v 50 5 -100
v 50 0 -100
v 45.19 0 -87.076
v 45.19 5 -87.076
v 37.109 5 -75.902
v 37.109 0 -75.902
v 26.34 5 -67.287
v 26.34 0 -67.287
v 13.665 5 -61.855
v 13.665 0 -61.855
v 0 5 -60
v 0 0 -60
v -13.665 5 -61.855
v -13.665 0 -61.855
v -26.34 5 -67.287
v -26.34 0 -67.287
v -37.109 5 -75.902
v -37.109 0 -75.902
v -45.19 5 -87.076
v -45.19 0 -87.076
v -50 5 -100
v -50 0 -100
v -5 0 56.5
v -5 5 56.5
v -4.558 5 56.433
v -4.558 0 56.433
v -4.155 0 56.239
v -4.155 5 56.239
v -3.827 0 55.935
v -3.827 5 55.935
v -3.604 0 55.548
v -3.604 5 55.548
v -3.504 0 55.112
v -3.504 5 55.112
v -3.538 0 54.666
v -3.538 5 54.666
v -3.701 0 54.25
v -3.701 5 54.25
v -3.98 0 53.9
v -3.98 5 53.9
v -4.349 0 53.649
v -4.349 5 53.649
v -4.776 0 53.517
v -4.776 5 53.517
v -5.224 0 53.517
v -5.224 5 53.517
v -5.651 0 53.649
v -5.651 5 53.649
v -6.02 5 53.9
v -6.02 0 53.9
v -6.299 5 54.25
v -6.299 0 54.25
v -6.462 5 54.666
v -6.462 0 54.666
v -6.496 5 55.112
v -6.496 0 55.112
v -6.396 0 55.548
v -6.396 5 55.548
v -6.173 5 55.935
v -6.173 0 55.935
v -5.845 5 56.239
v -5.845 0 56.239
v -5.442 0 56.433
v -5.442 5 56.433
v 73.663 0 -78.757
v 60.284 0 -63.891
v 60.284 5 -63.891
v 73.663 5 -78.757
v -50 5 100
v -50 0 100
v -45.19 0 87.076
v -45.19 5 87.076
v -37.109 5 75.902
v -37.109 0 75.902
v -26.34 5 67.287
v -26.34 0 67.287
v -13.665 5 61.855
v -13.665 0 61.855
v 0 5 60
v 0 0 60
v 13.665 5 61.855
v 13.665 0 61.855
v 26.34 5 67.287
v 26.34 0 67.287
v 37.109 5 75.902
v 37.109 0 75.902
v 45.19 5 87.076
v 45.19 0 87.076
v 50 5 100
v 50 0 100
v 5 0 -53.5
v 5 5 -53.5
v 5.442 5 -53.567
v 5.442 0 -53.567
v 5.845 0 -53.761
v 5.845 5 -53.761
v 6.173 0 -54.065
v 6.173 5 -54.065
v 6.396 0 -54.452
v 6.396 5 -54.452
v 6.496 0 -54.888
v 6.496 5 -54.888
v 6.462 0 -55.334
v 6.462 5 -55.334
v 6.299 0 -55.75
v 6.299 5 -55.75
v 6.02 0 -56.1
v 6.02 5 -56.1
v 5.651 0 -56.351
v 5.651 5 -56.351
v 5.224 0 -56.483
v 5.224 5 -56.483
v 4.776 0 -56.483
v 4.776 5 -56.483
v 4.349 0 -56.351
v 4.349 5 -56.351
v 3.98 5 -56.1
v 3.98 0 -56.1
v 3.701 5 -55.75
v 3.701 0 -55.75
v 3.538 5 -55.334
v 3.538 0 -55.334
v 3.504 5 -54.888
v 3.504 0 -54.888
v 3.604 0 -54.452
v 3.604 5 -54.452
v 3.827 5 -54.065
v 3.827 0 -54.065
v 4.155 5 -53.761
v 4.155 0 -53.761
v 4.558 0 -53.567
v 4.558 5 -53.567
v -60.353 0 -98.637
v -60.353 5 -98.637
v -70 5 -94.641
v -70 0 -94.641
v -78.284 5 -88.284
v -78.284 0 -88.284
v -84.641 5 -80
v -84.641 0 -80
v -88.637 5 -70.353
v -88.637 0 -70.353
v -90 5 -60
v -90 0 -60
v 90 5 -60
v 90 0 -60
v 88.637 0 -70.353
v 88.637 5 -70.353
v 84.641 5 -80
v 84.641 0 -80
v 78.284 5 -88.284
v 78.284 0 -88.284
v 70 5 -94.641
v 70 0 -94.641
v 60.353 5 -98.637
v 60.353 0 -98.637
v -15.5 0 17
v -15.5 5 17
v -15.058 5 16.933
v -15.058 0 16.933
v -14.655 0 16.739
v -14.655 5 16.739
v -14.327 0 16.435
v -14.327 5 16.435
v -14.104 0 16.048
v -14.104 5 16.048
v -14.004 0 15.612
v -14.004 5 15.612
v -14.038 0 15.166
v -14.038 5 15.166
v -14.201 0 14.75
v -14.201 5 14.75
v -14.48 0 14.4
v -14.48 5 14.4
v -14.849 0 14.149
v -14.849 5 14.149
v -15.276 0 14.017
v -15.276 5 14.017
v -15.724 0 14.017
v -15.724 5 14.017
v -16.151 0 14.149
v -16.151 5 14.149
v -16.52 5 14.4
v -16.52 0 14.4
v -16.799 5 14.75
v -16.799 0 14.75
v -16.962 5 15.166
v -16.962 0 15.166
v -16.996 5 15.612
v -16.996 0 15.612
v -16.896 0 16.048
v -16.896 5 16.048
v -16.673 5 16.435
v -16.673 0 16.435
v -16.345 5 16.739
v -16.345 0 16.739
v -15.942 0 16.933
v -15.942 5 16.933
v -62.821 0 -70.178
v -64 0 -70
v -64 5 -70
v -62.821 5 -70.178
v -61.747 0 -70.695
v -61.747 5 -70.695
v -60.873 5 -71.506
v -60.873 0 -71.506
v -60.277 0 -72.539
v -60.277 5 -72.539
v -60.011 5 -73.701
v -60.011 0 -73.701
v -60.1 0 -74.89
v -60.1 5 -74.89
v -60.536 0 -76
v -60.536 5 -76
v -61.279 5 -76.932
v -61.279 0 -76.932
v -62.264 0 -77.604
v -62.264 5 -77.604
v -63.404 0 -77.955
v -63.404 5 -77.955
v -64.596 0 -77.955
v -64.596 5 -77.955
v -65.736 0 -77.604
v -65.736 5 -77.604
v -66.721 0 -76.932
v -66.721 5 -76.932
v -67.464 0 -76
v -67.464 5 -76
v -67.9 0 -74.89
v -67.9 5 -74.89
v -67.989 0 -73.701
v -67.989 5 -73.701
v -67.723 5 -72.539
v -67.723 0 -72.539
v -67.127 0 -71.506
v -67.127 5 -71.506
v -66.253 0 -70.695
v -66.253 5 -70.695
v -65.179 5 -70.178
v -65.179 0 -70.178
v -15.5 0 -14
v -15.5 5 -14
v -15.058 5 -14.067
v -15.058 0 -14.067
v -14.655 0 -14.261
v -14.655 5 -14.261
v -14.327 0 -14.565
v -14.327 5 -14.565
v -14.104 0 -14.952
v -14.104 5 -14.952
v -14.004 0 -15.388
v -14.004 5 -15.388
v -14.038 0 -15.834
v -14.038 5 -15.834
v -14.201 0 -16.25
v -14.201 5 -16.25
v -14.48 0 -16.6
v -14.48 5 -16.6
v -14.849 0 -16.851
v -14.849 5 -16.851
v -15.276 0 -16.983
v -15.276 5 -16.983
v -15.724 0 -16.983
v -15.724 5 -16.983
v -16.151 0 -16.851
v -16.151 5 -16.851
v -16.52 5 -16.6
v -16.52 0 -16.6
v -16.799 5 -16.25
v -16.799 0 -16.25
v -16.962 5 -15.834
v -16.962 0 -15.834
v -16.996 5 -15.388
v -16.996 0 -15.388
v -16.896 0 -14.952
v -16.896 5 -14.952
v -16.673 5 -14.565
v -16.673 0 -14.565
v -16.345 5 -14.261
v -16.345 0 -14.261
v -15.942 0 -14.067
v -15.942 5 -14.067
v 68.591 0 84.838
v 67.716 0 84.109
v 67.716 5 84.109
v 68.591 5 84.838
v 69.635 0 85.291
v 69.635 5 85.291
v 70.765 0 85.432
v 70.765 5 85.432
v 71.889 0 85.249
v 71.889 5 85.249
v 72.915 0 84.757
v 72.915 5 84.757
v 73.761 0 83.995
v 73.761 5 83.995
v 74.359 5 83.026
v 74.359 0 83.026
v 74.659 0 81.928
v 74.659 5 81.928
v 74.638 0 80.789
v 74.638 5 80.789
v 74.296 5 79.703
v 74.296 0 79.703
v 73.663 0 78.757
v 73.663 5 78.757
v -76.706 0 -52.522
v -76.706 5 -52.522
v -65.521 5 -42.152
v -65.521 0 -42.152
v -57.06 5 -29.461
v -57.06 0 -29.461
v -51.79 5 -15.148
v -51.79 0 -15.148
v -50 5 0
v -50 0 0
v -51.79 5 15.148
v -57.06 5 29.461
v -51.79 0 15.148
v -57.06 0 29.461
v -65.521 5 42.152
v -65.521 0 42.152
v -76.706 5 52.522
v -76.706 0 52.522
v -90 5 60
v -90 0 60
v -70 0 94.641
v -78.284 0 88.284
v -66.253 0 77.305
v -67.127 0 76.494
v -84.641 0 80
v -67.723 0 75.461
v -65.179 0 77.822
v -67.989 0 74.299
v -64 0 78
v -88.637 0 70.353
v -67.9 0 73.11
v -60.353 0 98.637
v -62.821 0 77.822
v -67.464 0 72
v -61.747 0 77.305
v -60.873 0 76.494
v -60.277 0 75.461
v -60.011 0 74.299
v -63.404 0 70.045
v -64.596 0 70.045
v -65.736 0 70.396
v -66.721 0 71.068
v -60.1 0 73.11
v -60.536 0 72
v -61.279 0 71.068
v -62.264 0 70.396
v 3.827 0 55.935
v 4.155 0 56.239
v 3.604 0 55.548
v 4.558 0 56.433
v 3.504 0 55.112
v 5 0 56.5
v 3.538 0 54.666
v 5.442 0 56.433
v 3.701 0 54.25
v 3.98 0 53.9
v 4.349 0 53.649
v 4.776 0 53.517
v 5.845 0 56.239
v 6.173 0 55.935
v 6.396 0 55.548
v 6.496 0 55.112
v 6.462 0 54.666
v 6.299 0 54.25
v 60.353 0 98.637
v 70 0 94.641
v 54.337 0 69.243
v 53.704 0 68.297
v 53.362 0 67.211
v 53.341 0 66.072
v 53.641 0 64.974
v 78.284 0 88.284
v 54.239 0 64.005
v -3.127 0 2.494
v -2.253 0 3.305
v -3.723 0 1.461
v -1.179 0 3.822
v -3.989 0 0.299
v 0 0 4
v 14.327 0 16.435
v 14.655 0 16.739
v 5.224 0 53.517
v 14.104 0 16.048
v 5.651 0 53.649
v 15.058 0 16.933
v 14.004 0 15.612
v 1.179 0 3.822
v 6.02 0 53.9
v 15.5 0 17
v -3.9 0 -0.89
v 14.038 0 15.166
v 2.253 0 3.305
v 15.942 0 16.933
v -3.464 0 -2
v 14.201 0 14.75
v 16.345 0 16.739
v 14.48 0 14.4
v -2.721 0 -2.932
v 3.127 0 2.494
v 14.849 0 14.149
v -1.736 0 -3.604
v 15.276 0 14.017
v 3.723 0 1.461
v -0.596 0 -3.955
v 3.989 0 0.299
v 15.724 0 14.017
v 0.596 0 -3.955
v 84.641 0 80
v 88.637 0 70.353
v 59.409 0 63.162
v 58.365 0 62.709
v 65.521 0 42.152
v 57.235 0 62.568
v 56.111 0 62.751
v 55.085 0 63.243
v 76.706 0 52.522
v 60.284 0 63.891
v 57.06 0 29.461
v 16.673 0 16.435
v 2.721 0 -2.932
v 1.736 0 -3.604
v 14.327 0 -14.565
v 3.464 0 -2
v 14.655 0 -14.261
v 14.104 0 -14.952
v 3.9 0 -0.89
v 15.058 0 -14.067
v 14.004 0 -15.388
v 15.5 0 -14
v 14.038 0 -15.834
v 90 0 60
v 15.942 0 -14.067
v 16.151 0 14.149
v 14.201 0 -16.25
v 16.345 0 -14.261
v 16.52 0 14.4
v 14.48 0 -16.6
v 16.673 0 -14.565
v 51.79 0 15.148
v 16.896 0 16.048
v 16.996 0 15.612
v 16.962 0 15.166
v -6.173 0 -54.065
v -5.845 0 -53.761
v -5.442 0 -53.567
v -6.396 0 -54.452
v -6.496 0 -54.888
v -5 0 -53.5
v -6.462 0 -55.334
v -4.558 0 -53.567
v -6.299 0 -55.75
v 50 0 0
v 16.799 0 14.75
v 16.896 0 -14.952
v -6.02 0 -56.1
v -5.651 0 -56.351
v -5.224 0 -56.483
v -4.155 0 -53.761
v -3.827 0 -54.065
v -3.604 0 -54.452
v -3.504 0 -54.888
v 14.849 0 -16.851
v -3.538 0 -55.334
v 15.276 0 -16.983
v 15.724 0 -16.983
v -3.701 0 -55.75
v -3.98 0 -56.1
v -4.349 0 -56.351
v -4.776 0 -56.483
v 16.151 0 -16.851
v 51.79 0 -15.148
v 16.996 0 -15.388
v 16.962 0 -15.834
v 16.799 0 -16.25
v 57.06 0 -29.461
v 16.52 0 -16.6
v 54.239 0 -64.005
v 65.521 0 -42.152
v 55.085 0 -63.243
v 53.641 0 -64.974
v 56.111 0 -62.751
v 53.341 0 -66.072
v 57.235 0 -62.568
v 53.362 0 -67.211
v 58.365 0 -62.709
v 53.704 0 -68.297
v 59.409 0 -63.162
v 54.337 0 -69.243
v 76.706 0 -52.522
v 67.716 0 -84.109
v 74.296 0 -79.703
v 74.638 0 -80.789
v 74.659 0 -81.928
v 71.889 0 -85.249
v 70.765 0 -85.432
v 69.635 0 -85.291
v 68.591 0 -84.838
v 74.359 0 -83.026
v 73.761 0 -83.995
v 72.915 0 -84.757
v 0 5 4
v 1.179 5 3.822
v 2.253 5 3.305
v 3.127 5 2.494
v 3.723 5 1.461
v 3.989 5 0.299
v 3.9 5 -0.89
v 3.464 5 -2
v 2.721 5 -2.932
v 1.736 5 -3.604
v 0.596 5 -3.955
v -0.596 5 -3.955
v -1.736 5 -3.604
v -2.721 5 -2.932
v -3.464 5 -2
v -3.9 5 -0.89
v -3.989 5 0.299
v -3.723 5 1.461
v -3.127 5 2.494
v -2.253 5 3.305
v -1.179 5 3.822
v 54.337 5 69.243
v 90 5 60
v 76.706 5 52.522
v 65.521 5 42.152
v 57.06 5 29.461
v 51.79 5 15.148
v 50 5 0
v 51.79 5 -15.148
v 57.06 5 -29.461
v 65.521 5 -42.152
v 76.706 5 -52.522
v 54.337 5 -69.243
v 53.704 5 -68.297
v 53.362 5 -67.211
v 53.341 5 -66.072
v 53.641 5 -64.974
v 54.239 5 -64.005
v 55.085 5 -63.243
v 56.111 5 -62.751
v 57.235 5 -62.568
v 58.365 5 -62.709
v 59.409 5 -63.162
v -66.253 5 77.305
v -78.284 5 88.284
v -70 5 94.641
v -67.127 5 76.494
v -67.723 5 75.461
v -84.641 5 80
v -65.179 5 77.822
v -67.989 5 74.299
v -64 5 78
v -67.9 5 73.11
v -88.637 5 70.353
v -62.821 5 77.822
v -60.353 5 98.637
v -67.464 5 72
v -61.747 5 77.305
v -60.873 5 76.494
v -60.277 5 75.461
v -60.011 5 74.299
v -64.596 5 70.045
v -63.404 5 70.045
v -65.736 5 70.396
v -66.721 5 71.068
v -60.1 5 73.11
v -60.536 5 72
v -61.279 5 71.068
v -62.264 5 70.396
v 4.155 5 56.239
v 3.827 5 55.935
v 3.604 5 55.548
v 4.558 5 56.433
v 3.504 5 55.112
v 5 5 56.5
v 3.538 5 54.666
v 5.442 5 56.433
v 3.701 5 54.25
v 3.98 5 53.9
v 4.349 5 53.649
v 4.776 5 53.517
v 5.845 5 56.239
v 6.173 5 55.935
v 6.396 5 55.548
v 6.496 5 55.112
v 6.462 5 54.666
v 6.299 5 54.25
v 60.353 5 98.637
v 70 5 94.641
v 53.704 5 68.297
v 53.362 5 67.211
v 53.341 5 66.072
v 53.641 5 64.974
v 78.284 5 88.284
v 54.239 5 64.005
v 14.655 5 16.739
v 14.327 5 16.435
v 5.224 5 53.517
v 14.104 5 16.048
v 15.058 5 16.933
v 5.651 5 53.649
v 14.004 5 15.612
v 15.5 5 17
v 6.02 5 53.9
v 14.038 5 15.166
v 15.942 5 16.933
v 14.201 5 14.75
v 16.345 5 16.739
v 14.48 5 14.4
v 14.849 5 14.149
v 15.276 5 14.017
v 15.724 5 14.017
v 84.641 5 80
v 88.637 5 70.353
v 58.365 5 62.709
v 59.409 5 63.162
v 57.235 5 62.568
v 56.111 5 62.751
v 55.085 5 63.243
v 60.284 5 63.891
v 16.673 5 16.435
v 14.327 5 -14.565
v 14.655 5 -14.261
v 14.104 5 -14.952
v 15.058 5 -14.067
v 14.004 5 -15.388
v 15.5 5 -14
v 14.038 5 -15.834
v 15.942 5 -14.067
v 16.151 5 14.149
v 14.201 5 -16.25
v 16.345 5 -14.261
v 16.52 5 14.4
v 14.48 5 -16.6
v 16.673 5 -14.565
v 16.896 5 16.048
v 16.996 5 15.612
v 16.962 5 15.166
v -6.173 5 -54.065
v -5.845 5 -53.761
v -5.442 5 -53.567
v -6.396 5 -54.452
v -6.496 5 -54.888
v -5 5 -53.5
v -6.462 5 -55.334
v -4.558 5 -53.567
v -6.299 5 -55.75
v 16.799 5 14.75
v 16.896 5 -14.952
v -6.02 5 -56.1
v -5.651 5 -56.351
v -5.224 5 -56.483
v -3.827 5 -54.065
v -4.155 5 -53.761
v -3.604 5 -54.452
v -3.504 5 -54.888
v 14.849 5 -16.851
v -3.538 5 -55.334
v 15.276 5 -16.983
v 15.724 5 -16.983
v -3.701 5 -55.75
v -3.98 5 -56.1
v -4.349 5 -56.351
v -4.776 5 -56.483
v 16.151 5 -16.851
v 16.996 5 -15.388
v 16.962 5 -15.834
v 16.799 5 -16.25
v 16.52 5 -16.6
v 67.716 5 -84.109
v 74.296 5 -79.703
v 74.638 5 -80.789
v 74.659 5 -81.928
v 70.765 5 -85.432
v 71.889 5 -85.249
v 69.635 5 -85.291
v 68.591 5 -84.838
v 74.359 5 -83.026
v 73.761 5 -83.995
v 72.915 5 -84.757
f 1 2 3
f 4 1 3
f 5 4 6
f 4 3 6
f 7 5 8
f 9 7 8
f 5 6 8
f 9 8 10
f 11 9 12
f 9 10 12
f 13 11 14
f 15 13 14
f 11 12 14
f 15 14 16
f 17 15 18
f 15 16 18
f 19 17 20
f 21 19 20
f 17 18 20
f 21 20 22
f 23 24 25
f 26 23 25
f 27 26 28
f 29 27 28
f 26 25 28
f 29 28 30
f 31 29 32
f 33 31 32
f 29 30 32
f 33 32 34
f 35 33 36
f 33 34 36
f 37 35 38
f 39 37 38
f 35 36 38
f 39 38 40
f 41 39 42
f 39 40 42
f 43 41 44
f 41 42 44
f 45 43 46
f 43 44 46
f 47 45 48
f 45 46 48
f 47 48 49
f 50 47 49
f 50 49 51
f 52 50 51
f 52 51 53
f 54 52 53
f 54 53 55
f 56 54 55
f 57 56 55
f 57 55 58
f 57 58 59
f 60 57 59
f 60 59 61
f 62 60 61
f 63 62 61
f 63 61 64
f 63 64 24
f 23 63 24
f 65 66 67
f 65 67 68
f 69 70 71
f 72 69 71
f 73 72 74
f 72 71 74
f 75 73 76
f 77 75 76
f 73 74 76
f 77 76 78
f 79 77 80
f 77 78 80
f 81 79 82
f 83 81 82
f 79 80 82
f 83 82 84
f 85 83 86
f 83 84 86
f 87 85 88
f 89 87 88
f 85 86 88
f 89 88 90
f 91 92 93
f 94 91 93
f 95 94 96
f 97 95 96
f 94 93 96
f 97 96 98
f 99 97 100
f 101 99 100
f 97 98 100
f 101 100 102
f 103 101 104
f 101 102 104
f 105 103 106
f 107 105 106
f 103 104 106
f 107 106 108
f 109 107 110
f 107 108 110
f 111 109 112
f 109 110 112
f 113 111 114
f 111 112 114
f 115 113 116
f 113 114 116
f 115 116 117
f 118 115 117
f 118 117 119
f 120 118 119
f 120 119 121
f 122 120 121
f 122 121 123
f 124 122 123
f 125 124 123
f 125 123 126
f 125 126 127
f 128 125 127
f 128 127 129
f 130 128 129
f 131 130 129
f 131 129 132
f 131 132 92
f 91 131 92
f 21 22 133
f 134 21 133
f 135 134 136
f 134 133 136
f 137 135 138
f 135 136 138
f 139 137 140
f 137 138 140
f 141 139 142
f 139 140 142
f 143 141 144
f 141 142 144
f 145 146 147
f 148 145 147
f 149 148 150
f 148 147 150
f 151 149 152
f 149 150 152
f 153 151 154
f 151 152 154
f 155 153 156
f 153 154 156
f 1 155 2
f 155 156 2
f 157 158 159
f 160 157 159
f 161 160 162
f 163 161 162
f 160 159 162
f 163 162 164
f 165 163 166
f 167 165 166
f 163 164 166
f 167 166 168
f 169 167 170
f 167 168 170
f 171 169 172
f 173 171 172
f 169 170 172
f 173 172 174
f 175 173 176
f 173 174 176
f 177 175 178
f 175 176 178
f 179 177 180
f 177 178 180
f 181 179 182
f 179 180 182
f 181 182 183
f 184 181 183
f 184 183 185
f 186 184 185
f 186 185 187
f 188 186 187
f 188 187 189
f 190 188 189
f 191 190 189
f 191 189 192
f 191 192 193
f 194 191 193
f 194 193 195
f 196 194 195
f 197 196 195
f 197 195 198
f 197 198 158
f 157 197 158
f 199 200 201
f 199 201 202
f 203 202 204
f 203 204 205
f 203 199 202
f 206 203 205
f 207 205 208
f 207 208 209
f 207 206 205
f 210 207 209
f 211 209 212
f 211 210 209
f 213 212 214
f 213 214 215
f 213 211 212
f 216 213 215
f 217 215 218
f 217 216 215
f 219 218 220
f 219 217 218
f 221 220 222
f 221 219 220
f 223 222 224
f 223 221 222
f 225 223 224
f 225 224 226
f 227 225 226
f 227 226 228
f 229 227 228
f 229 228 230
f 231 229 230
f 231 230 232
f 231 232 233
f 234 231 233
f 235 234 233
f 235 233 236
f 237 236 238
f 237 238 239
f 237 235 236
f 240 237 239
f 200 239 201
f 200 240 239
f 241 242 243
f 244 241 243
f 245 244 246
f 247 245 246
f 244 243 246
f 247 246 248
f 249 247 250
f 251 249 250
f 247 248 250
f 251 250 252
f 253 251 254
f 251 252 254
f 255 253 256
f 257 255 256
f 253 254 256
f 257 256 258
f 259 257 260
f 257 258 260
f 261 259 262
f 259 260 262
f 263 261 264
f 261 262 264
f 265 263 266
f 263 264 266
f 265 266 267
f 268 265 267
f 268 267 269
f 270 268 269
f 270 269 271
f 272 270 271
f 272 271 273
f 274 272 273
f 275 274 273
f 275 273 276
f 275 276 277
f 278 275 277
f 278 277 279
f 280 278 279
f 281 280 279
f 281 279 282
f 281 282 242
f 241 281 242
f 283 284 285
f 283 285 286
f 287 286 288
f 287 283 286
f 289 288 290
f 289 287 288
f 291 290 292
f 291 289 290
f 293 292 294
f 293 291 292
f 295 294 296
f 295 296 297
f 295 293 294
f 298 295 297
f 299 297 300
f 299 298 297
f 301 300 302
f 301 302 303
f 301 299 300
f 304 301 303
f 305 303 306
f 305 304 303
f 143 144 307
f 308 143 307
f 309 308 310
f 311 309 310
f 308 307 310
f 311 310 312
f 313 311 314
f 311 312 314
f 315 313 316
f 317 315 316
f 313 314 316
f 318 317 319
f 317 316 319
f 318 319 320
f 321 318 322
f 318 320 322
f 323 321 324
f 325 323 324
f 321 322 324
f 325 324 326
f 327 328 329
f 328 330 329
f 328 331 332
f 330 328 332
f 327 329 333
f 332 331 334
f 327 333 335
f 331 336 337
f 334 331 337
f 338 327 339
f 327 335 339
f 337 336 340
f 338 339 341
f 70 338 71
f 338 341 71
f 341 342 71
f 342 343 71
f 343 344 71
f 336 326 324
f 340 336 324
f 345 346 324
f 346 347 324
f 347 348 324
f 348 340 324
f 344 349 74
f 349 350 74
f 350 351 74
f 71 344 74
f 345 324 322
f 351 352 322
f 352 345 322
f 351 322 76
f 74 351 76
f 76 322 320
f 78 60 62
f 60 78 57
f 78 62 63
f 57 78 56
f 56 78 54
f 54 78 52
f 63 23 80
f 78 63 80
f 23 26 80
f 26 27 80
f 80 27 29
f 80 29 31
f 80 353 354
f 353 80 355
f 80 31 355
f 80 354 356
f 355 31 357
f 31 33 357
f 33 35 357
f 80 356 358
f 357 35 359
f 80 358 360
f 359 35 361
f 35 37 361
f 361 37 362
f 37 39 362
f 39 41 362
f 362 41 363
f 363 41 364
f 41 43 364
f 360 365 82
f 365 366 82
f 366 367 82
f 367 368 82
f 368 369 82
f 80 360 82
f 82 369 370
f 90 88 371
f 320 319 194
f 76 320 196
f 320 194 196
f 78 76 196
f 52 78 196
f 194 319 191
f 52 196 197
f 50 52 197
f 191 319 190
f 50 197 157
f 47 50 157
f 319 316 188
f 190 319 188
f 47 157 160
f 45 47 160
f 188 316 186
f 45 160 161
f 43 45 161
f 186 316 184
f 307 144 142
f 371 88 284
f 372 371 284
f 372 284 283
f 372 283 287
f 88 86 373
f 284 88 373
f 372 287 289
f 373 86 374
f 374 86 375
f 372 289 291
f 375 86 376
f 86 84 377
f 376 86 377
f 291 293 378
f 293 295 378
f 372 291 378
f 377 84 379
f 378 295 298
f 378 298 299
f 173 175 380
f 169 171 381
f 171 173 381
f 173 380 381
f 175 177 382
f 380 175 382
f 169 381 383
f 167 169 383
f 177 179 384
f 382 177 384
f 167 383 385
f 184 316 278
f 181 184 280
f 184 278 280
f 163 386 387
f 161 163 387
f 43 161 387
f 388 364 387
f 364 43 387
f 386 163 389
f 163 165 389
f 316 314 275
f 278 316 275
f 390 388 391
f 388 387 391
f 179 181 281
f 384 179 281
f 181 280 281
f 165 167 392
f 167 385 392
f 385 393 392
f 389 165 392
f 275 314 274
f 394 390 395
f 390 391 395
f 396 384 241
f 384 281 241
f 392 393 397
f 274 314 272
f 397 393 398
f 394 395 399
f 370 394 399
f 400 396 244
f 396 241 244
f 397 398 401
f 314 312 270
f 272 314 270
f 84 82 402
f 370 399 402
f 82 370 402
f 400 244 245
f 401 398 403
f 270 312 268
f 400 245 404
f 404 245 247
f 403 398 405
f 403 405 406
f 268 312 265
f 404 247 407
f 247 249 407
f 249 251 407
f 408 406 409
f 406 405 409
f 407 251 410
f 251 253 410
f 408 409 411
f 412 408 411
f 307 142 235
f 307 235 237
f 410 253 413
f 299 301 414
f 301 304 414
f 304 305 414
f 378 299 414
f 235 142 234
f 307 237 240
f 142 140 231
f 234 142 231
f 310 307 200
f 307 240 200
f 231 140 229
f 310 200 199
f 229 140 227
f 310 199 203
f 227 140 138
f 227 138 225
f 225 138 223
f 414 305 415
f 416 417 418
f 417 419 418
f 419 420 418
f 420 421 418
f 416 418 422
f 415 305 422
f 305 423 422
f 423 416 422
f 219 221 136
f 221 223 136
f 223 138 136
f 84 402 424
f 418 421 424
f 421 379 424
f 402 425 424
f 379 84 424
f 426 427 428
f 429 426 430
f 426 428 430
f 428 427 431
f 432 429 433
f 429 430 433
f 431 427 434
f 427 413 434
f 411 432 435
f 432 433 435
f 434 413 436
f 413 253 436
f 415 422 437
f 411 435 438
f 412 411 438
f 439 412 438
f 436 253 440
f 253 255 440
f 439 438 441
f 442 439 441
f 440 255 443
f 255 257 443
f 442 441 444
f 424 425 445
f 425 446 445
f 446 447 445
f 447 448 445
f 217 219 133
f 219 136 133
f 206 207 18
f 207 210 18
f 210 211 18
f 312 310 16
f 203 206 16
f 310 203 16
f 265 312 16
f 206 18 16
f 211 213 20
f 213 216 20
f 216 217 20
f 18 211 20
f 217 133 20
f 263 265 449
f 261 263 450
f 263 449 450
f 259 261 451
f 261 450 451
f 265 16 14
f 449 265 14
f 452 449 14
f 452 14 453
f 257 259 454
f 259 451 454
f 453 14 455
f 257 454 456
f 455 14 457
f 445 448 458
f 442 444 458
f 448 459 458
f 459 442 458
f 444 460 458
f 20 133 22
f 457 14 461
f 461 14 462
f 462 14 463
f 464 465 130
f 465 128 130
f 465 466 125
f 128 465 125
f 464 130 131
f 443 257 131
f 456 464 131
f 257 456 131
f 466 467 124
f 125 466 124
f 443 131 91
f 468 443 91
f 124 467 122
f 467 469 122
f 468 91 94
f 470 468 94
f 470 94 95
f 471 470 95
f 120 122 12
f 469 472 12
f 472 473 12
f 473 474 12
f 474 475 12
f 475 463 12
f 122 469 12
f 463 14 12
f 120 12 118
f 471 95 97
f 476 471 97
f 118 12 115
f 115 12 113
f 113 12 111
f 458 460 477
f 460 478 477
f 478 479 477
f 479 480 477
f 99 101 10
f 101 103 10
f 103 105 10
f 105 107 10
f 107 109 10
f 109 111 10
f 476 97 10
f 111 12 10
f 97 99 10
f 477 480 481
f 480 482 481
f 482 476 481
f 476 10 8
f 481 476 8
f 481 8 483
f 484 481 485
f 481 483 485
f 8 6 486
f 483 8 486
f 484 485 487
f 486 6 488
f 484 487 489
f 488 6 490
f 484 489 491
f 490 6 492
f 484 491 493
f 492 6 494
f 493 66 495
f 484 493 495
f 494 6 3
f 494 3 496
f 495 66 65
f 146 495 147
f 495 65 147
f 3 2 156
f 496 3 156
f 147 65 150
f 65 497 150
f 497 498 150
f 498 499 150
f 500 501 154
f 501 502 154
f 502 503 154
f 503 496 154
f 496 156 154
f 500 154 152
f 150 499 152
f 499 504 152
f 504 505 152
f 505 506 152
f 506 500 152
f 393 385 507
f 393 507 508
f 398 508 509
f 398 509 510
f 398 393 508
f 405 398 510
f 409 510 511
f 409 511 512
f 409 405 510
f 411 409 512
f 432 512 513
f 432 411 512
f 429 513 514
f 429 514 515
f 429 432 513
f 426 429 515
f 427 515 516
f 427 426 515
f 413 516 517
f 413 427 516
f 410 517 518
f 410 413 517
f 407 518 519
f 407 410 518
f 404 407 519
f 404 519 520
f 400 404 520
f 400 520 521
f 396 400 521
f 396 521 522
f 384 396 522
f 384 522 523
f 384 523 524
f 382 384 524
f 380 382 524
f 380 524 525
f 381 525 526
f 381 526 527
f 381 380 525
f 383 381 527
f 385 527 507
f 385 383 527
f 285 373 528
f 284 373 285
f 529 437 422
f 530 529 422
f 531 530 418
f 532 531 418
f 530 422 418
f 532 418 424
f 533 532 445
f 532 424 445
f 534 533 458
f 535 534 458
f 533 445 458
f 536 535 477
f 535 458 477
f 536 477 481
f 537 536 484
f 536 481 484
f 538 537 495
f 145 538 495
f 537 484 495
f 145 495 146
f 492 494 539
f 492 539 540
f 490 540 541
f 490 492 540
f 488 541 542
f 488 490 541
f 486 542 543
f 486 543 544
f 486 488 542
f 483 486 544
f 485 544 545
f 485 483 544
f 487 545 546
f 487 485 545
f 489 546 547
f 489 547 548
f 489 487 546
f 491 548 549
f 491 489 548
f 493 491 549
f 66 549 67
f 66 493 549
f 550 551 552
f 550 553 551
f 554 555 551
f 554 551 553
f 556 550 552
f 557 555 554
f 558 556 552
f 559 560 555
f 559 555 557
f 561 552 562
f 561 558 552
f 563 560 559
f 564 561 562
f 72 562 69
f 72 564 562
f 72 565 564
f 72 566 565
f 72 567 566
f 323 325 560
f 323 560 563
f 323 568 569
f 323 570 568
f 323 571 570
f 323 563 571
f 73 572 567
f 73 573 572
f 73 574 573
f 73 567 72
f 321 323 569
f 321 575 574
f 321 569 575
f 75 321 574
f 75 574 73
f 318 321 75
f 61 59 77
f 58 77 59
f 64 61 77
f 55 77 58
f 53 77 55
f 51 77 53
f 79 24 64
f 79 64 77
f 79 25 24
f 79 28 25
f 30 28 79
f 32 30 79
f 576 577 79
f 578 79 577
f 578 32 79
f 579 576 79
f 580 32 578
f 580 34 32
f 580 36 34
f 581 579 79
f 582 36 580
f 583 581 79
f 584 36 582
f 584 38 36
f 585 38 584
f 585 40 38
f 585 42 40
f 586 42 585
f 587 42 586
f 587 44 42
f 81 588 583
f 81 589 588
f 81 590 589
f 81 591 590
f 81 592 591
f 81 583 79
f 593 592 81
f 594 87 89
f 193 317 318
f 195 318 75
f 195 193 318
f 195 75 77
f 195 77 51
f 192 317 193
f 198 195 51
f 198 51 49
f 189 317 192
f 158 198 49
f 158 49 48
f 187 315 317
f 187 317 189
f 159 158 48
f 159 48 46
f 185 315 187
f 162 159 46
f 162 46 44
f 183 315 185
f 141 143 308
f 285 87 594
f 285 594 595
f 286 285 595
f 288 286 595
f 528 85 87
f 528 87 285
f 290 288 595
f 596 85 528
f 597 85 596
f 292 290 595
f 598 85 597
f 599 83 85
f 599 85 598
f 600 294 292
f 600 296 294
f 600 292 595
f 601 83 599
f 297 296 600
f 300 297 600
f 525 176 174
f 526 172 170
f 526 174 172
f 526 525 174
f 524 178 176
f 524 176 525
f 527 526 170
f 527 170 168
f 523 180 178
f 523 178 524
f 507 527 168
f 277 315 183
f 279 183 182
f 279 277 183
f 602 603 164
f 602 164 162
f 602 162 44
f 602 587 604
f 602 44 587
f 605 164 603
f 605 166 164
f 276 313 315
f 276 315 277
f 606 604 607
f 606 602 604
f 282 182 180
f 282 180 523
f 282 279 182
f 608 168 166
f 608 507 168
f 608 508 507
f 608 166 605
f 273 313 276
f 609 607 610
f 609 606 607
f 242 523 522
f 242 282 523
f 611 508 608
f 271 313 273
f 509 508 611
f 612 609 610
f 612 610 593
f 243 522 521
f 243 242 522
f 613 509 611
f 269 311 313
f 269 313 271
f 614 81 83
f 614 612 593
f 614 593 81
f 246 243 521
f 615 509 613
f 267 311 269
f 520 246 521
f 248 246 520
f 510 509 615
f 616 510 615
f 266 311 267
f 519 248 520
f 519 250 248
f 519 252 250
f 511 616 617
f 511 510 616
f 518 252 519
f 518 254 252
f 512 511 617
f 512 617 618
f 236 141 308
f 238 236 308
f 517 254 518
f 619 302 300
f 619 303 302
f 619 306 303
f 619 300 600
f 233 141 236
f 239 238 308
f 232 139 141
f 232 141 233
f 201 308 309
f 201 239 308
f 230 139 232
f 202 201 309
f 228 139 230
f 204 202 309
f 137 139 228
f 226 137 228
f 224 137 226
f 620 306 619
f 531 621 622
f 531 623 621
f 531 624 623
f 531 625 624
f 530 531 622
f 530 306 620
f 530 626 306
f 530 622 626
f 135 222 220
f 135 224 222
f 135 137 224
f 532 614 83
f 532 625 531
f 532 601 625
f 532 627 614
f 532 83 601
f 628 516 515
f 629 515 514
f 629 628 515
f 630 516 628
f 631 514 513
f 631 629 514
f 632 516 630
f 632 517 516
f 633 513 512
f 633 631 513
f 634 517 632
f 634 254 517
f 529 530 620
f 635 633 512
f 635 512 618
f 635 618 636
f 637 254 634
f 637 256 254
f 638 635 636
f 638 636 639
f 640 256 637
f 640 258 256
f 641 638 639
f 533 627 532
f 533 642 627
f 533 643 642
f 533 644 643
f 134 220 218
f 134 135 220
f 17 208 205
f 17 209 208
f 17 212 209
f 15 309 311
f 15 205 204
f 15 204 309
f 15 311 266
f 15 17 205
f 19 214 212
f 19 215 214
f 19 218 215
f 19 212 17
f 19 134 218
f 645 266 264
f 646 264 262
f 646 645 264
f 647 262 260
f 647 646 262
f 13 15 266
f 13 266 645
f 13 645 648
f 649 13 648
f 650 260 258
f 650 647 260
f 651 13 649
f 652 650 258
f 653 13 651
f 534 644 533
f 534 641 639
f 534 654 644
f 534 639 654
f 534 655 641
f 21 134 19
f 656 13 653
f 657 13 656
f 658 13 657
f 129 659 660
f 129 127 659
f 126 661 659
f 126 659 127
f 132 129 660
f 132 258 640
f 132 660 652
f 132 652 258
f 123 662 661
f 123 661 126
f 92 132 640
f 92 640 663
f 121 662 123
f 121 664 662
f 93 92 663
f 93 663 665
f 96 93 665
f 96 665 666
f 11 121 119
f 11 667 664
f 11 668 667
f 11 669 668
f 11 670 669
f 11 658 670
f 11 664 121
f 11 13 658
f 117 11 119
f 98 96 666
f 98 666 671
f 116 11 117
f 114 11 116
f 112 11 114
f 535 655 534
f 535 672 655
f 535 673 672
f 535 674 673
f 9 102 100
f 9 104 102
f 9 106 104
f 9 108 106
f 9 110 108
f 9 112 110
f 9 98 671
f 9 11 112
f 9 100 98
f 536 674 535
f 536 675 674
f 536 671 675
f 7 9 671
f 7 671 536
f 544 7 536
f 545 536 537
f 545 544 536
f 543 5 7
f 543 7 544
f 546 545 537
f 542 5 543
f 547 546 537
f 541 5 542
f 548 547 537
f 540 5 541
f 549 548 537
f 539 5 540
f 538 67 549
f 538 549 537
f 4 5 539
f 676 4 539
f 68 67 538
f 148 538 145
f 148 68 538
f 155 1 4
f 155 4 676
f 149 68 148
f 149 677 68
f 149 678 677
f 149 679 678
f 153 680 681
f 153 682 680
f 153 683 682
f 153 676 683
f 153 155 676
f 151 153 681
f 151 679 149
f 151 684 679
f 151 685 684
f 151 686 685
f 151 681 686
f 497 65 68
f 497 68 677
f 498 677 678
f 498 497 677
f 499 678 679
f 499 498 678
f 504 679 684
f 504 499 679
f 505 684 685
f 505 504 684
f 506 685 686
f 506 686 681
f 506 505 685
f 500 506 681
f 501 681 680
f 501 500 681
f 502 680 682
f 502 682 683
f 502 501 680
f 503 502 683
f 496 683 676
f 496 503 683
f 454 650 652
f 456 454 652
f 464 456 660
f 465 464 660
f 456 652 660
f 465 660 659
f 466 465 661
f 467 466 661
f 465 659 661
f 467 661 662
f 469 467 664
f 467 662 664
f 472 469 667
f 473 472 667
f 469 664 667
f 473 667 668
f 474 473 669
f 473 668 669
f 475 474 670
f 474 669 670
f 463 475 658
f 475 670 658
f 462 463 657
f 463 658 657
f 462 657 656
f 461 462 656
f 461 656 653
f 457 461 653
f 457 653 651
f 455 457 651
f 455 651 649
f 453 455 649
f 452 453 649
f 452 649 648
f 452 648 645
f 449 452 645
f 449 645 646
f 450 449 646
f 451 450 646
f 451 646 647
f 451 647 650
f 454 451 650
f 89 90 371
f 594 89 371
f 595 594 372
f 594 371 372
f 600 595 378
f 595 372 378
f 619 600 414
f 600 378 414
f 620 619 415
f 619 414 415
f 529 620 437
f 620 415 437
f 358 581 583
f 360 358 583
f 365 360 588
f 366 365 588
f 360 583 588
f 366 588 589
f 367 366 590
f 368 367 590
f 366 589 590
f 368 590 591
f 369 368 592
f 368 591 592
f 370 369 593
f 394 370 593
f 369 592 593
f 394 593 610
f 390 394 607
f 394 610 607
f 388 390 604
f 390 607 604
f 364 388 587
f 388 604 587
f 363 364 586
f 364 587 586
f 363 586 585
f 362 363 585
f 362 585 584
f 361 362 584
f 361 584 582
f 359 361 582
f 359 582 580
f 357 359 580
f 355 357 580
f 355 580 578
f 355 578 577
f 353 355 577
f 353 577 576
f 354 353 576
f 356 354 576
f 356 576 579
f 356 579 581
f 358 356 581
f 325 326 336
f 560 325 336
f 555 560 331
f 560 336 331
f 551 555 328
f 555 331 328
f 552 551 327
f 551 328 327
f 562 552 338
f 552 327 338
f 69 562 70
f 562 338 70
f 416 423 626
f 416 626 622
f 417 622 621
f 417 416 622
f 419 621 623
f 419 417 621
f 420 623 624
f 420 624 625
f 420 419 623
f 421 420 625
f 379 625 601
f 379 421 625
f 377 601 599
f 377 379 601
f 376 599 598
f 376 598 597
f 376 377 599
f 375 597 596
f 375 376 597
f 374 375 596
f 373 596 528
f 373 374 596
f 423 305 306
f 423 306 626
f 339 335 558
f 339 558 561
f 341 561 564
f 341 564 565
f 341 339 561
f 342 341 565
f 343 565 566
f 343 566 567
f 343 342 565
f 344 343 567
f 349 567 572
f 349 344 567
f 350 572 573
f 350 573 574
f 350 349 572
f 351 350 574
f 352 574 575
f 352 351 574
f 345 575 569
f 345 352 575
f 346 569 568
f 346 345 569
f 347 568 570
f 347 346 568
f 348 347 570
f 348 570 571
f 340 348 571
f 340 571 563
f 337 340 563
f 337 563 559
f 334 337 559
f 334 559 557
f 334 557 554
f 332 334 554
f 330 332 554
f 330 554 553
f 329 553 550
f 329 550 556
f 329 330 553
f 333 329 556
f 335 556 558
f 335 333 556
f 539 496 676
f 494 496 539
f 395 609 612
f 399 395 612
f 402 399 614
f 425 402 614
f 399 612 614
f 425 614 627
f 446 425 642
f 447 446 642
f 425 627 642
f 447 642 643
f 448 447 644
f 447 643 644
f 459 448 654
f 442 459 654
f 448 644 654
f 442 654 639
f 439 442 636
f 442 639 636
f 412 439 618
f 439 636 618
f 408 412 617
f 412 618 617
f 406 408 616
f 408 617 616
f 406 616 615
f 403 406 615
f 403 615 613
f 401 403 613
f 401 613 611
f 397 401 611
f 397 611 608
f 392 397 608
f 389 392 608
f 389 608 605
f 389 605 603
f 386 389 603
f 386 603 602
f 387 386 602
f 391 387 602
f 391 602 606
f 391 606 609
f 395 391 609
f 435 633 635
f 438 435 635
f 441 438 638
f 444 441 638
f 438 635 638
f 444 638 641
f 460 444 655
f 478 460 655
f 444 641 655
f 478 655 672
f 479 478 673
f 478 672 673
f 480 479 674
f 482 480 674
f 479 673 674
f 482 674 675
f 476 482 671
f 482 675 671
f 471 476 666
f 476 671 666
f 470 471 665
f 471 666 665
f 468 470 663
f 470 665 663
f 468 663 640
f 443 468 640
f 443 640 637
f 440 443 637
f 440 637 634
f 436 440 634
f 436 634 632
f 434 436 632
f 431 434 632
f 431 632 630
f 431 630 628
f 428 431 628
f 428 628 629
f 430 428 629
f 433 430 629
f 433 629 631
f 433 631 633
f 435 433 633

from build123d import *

# Parameters (mm, degrees)
SCHIZZO1_R                   = 4
ESTRUSIONE_ESTRUSIONE1_DEPTH = 5
SCHIZZO2_R                   = 1.5
TAGLIO_ESTRUSIONE1_DEPTH     = 135.629120178
SCHIZZO3_R                   = 1.5
TAGLIO_ESTRUSIONE2_DEPTH     = 135.629120178


with BuildPart() as part:
    # Schizzo1 → Estrusione-Estrusione1 (new body)
    with BuildSketch(Plane(origin=(0, 0, 0), x_dir=(1, 0, 0), z_dir=(0, 1, 0))):
        with BuildLine():
            ThreePointArc((-50, 100), (-78.284271247, 88.284271247), (-90, 60))
            ThreePointArc((-90, 60), (-50, 0), (-90, -60))
            ThreePointArc((-90, -60), (-78.284271247, -88.284271247), (-50, -100))
            ThreePointArc((-50, -100), (0, -60), (50, -100))
            ThreePointArc((50, -100), (78.284271247, -88.284271247), (90, -60))
            ThreePointArc((90, -60), (50, 0), (90, 60))
            ThreePointArc((90, 60), (78.284271247, 88.284271247), (50, 100))
            ThreePointArc((50, 100), (0, 60), (-50, 100))
        make_face()
        with Locations(Location((-64, 74, 0), (0, 0, 270))):
            Circle(SCHIZZO1_R, mode=Mode.SUBTRACT)
        with Locations(Location((-64, -74, 0), (0, 0, 270))):
            Circle(SCHIZZO1_R, mode=Mode.SUBTRACT)
        with Locations(Location((0, 0, 0), (0, 0, 270))):
            Circle(SCHIZZO1_R, mode=Mode.SUBTRACT)
        with BuildLine():
            Line((73.662823901, -78.757082536), (60.283529269, -63.891199611))
            ThreePointArc((60.283529269, -63.891199611), (54.634493757, -63.593881953), (54.337176099, -69.242917464))
            Line((54.337176099, -69.242917464), (67.716470731, -84.108800389))
            ThreePointArc((67.716470731, -84.108800389), (73.365506243, -84.406118047), (73.662823901, -78.757082536))
        make_face(mode=Mode.SUBTRACT)
        with BuildLine():
            Line((60.283529269, 63.891199611), (73.662823901, 78.757082536))
            ThreePointArc((73.662823901, 78.757082536), (73.365506243, 84.406118047), (67.716470731, 84.108800389))
            Line((67.716470731, 84.108800389), (54.337176099, 69.242917464))
            ThreePointArc((54.337176099, 69.242917464), (54.634493757, 63.593881953), (60.283529269, 63.891199611))
        make_face(mode=Mode.SUBTRACT)
    extrude(amount=ESTRUSIONE_ESTRUSIONE1_DEPTH)

    # Schizzo2 → Taglio-Estrusione1 (cut, through all)
    with BuildSketch(Plane(origin=(0, 5, 0), x_dir=(1, 0, 0), z_dir=(0, 1, 0))):
        with Locations(Location((-15.5, 15.5, 0), (0, 0, 270))):
            Circle(SCHIZZO2_R)
        with Locations(Location((15.5, 15.5, 0), (0, 0, 270))):
            Circle(SCHIZZO2_R)
        with Locations(Location((15.5, -15.5, 0), (0, 0, 270))):
            Circle(SCHIZZO2_R)
        with Locations(Location((-15.5, -15.5, 0), (0, 0, 270))):
            Circle(SCHIZZO2_R)
    extrude(amount=-TAGLIO_ESTRUSIONE1_DEPTH, mode=Mode.SUBTRACT)

    # Schizzo3 → Taglio-Estrusione2 (cut, through all)
    with BuildSketch(Plane(origin=(0, 5, 0), x_dir=(1, 0, 0), z_dir=(0, 1, 0))):
        with Locations(Location((-5, 55, 0), (0, 0, 270))):
            Circle(SCHIZZO3_R)
        with Locations(Location((5, 55, 0), (0, 0, 270))):
            Circle(SCHIZZO3_R)
        with Locations(Location((-5, -55, 0), (0, 0, 270))):
            Circle(SCHIZZO3_R)
        with Locations(Location((5, -55, 0), (0, 0, 270))):
            Circle(SCHIZZO3_R)
    extrude(amount=-TAGLIO_ESTRUSIONE2_DEPTH, mode=Mode.SUBTRACT)


solid = part.part
